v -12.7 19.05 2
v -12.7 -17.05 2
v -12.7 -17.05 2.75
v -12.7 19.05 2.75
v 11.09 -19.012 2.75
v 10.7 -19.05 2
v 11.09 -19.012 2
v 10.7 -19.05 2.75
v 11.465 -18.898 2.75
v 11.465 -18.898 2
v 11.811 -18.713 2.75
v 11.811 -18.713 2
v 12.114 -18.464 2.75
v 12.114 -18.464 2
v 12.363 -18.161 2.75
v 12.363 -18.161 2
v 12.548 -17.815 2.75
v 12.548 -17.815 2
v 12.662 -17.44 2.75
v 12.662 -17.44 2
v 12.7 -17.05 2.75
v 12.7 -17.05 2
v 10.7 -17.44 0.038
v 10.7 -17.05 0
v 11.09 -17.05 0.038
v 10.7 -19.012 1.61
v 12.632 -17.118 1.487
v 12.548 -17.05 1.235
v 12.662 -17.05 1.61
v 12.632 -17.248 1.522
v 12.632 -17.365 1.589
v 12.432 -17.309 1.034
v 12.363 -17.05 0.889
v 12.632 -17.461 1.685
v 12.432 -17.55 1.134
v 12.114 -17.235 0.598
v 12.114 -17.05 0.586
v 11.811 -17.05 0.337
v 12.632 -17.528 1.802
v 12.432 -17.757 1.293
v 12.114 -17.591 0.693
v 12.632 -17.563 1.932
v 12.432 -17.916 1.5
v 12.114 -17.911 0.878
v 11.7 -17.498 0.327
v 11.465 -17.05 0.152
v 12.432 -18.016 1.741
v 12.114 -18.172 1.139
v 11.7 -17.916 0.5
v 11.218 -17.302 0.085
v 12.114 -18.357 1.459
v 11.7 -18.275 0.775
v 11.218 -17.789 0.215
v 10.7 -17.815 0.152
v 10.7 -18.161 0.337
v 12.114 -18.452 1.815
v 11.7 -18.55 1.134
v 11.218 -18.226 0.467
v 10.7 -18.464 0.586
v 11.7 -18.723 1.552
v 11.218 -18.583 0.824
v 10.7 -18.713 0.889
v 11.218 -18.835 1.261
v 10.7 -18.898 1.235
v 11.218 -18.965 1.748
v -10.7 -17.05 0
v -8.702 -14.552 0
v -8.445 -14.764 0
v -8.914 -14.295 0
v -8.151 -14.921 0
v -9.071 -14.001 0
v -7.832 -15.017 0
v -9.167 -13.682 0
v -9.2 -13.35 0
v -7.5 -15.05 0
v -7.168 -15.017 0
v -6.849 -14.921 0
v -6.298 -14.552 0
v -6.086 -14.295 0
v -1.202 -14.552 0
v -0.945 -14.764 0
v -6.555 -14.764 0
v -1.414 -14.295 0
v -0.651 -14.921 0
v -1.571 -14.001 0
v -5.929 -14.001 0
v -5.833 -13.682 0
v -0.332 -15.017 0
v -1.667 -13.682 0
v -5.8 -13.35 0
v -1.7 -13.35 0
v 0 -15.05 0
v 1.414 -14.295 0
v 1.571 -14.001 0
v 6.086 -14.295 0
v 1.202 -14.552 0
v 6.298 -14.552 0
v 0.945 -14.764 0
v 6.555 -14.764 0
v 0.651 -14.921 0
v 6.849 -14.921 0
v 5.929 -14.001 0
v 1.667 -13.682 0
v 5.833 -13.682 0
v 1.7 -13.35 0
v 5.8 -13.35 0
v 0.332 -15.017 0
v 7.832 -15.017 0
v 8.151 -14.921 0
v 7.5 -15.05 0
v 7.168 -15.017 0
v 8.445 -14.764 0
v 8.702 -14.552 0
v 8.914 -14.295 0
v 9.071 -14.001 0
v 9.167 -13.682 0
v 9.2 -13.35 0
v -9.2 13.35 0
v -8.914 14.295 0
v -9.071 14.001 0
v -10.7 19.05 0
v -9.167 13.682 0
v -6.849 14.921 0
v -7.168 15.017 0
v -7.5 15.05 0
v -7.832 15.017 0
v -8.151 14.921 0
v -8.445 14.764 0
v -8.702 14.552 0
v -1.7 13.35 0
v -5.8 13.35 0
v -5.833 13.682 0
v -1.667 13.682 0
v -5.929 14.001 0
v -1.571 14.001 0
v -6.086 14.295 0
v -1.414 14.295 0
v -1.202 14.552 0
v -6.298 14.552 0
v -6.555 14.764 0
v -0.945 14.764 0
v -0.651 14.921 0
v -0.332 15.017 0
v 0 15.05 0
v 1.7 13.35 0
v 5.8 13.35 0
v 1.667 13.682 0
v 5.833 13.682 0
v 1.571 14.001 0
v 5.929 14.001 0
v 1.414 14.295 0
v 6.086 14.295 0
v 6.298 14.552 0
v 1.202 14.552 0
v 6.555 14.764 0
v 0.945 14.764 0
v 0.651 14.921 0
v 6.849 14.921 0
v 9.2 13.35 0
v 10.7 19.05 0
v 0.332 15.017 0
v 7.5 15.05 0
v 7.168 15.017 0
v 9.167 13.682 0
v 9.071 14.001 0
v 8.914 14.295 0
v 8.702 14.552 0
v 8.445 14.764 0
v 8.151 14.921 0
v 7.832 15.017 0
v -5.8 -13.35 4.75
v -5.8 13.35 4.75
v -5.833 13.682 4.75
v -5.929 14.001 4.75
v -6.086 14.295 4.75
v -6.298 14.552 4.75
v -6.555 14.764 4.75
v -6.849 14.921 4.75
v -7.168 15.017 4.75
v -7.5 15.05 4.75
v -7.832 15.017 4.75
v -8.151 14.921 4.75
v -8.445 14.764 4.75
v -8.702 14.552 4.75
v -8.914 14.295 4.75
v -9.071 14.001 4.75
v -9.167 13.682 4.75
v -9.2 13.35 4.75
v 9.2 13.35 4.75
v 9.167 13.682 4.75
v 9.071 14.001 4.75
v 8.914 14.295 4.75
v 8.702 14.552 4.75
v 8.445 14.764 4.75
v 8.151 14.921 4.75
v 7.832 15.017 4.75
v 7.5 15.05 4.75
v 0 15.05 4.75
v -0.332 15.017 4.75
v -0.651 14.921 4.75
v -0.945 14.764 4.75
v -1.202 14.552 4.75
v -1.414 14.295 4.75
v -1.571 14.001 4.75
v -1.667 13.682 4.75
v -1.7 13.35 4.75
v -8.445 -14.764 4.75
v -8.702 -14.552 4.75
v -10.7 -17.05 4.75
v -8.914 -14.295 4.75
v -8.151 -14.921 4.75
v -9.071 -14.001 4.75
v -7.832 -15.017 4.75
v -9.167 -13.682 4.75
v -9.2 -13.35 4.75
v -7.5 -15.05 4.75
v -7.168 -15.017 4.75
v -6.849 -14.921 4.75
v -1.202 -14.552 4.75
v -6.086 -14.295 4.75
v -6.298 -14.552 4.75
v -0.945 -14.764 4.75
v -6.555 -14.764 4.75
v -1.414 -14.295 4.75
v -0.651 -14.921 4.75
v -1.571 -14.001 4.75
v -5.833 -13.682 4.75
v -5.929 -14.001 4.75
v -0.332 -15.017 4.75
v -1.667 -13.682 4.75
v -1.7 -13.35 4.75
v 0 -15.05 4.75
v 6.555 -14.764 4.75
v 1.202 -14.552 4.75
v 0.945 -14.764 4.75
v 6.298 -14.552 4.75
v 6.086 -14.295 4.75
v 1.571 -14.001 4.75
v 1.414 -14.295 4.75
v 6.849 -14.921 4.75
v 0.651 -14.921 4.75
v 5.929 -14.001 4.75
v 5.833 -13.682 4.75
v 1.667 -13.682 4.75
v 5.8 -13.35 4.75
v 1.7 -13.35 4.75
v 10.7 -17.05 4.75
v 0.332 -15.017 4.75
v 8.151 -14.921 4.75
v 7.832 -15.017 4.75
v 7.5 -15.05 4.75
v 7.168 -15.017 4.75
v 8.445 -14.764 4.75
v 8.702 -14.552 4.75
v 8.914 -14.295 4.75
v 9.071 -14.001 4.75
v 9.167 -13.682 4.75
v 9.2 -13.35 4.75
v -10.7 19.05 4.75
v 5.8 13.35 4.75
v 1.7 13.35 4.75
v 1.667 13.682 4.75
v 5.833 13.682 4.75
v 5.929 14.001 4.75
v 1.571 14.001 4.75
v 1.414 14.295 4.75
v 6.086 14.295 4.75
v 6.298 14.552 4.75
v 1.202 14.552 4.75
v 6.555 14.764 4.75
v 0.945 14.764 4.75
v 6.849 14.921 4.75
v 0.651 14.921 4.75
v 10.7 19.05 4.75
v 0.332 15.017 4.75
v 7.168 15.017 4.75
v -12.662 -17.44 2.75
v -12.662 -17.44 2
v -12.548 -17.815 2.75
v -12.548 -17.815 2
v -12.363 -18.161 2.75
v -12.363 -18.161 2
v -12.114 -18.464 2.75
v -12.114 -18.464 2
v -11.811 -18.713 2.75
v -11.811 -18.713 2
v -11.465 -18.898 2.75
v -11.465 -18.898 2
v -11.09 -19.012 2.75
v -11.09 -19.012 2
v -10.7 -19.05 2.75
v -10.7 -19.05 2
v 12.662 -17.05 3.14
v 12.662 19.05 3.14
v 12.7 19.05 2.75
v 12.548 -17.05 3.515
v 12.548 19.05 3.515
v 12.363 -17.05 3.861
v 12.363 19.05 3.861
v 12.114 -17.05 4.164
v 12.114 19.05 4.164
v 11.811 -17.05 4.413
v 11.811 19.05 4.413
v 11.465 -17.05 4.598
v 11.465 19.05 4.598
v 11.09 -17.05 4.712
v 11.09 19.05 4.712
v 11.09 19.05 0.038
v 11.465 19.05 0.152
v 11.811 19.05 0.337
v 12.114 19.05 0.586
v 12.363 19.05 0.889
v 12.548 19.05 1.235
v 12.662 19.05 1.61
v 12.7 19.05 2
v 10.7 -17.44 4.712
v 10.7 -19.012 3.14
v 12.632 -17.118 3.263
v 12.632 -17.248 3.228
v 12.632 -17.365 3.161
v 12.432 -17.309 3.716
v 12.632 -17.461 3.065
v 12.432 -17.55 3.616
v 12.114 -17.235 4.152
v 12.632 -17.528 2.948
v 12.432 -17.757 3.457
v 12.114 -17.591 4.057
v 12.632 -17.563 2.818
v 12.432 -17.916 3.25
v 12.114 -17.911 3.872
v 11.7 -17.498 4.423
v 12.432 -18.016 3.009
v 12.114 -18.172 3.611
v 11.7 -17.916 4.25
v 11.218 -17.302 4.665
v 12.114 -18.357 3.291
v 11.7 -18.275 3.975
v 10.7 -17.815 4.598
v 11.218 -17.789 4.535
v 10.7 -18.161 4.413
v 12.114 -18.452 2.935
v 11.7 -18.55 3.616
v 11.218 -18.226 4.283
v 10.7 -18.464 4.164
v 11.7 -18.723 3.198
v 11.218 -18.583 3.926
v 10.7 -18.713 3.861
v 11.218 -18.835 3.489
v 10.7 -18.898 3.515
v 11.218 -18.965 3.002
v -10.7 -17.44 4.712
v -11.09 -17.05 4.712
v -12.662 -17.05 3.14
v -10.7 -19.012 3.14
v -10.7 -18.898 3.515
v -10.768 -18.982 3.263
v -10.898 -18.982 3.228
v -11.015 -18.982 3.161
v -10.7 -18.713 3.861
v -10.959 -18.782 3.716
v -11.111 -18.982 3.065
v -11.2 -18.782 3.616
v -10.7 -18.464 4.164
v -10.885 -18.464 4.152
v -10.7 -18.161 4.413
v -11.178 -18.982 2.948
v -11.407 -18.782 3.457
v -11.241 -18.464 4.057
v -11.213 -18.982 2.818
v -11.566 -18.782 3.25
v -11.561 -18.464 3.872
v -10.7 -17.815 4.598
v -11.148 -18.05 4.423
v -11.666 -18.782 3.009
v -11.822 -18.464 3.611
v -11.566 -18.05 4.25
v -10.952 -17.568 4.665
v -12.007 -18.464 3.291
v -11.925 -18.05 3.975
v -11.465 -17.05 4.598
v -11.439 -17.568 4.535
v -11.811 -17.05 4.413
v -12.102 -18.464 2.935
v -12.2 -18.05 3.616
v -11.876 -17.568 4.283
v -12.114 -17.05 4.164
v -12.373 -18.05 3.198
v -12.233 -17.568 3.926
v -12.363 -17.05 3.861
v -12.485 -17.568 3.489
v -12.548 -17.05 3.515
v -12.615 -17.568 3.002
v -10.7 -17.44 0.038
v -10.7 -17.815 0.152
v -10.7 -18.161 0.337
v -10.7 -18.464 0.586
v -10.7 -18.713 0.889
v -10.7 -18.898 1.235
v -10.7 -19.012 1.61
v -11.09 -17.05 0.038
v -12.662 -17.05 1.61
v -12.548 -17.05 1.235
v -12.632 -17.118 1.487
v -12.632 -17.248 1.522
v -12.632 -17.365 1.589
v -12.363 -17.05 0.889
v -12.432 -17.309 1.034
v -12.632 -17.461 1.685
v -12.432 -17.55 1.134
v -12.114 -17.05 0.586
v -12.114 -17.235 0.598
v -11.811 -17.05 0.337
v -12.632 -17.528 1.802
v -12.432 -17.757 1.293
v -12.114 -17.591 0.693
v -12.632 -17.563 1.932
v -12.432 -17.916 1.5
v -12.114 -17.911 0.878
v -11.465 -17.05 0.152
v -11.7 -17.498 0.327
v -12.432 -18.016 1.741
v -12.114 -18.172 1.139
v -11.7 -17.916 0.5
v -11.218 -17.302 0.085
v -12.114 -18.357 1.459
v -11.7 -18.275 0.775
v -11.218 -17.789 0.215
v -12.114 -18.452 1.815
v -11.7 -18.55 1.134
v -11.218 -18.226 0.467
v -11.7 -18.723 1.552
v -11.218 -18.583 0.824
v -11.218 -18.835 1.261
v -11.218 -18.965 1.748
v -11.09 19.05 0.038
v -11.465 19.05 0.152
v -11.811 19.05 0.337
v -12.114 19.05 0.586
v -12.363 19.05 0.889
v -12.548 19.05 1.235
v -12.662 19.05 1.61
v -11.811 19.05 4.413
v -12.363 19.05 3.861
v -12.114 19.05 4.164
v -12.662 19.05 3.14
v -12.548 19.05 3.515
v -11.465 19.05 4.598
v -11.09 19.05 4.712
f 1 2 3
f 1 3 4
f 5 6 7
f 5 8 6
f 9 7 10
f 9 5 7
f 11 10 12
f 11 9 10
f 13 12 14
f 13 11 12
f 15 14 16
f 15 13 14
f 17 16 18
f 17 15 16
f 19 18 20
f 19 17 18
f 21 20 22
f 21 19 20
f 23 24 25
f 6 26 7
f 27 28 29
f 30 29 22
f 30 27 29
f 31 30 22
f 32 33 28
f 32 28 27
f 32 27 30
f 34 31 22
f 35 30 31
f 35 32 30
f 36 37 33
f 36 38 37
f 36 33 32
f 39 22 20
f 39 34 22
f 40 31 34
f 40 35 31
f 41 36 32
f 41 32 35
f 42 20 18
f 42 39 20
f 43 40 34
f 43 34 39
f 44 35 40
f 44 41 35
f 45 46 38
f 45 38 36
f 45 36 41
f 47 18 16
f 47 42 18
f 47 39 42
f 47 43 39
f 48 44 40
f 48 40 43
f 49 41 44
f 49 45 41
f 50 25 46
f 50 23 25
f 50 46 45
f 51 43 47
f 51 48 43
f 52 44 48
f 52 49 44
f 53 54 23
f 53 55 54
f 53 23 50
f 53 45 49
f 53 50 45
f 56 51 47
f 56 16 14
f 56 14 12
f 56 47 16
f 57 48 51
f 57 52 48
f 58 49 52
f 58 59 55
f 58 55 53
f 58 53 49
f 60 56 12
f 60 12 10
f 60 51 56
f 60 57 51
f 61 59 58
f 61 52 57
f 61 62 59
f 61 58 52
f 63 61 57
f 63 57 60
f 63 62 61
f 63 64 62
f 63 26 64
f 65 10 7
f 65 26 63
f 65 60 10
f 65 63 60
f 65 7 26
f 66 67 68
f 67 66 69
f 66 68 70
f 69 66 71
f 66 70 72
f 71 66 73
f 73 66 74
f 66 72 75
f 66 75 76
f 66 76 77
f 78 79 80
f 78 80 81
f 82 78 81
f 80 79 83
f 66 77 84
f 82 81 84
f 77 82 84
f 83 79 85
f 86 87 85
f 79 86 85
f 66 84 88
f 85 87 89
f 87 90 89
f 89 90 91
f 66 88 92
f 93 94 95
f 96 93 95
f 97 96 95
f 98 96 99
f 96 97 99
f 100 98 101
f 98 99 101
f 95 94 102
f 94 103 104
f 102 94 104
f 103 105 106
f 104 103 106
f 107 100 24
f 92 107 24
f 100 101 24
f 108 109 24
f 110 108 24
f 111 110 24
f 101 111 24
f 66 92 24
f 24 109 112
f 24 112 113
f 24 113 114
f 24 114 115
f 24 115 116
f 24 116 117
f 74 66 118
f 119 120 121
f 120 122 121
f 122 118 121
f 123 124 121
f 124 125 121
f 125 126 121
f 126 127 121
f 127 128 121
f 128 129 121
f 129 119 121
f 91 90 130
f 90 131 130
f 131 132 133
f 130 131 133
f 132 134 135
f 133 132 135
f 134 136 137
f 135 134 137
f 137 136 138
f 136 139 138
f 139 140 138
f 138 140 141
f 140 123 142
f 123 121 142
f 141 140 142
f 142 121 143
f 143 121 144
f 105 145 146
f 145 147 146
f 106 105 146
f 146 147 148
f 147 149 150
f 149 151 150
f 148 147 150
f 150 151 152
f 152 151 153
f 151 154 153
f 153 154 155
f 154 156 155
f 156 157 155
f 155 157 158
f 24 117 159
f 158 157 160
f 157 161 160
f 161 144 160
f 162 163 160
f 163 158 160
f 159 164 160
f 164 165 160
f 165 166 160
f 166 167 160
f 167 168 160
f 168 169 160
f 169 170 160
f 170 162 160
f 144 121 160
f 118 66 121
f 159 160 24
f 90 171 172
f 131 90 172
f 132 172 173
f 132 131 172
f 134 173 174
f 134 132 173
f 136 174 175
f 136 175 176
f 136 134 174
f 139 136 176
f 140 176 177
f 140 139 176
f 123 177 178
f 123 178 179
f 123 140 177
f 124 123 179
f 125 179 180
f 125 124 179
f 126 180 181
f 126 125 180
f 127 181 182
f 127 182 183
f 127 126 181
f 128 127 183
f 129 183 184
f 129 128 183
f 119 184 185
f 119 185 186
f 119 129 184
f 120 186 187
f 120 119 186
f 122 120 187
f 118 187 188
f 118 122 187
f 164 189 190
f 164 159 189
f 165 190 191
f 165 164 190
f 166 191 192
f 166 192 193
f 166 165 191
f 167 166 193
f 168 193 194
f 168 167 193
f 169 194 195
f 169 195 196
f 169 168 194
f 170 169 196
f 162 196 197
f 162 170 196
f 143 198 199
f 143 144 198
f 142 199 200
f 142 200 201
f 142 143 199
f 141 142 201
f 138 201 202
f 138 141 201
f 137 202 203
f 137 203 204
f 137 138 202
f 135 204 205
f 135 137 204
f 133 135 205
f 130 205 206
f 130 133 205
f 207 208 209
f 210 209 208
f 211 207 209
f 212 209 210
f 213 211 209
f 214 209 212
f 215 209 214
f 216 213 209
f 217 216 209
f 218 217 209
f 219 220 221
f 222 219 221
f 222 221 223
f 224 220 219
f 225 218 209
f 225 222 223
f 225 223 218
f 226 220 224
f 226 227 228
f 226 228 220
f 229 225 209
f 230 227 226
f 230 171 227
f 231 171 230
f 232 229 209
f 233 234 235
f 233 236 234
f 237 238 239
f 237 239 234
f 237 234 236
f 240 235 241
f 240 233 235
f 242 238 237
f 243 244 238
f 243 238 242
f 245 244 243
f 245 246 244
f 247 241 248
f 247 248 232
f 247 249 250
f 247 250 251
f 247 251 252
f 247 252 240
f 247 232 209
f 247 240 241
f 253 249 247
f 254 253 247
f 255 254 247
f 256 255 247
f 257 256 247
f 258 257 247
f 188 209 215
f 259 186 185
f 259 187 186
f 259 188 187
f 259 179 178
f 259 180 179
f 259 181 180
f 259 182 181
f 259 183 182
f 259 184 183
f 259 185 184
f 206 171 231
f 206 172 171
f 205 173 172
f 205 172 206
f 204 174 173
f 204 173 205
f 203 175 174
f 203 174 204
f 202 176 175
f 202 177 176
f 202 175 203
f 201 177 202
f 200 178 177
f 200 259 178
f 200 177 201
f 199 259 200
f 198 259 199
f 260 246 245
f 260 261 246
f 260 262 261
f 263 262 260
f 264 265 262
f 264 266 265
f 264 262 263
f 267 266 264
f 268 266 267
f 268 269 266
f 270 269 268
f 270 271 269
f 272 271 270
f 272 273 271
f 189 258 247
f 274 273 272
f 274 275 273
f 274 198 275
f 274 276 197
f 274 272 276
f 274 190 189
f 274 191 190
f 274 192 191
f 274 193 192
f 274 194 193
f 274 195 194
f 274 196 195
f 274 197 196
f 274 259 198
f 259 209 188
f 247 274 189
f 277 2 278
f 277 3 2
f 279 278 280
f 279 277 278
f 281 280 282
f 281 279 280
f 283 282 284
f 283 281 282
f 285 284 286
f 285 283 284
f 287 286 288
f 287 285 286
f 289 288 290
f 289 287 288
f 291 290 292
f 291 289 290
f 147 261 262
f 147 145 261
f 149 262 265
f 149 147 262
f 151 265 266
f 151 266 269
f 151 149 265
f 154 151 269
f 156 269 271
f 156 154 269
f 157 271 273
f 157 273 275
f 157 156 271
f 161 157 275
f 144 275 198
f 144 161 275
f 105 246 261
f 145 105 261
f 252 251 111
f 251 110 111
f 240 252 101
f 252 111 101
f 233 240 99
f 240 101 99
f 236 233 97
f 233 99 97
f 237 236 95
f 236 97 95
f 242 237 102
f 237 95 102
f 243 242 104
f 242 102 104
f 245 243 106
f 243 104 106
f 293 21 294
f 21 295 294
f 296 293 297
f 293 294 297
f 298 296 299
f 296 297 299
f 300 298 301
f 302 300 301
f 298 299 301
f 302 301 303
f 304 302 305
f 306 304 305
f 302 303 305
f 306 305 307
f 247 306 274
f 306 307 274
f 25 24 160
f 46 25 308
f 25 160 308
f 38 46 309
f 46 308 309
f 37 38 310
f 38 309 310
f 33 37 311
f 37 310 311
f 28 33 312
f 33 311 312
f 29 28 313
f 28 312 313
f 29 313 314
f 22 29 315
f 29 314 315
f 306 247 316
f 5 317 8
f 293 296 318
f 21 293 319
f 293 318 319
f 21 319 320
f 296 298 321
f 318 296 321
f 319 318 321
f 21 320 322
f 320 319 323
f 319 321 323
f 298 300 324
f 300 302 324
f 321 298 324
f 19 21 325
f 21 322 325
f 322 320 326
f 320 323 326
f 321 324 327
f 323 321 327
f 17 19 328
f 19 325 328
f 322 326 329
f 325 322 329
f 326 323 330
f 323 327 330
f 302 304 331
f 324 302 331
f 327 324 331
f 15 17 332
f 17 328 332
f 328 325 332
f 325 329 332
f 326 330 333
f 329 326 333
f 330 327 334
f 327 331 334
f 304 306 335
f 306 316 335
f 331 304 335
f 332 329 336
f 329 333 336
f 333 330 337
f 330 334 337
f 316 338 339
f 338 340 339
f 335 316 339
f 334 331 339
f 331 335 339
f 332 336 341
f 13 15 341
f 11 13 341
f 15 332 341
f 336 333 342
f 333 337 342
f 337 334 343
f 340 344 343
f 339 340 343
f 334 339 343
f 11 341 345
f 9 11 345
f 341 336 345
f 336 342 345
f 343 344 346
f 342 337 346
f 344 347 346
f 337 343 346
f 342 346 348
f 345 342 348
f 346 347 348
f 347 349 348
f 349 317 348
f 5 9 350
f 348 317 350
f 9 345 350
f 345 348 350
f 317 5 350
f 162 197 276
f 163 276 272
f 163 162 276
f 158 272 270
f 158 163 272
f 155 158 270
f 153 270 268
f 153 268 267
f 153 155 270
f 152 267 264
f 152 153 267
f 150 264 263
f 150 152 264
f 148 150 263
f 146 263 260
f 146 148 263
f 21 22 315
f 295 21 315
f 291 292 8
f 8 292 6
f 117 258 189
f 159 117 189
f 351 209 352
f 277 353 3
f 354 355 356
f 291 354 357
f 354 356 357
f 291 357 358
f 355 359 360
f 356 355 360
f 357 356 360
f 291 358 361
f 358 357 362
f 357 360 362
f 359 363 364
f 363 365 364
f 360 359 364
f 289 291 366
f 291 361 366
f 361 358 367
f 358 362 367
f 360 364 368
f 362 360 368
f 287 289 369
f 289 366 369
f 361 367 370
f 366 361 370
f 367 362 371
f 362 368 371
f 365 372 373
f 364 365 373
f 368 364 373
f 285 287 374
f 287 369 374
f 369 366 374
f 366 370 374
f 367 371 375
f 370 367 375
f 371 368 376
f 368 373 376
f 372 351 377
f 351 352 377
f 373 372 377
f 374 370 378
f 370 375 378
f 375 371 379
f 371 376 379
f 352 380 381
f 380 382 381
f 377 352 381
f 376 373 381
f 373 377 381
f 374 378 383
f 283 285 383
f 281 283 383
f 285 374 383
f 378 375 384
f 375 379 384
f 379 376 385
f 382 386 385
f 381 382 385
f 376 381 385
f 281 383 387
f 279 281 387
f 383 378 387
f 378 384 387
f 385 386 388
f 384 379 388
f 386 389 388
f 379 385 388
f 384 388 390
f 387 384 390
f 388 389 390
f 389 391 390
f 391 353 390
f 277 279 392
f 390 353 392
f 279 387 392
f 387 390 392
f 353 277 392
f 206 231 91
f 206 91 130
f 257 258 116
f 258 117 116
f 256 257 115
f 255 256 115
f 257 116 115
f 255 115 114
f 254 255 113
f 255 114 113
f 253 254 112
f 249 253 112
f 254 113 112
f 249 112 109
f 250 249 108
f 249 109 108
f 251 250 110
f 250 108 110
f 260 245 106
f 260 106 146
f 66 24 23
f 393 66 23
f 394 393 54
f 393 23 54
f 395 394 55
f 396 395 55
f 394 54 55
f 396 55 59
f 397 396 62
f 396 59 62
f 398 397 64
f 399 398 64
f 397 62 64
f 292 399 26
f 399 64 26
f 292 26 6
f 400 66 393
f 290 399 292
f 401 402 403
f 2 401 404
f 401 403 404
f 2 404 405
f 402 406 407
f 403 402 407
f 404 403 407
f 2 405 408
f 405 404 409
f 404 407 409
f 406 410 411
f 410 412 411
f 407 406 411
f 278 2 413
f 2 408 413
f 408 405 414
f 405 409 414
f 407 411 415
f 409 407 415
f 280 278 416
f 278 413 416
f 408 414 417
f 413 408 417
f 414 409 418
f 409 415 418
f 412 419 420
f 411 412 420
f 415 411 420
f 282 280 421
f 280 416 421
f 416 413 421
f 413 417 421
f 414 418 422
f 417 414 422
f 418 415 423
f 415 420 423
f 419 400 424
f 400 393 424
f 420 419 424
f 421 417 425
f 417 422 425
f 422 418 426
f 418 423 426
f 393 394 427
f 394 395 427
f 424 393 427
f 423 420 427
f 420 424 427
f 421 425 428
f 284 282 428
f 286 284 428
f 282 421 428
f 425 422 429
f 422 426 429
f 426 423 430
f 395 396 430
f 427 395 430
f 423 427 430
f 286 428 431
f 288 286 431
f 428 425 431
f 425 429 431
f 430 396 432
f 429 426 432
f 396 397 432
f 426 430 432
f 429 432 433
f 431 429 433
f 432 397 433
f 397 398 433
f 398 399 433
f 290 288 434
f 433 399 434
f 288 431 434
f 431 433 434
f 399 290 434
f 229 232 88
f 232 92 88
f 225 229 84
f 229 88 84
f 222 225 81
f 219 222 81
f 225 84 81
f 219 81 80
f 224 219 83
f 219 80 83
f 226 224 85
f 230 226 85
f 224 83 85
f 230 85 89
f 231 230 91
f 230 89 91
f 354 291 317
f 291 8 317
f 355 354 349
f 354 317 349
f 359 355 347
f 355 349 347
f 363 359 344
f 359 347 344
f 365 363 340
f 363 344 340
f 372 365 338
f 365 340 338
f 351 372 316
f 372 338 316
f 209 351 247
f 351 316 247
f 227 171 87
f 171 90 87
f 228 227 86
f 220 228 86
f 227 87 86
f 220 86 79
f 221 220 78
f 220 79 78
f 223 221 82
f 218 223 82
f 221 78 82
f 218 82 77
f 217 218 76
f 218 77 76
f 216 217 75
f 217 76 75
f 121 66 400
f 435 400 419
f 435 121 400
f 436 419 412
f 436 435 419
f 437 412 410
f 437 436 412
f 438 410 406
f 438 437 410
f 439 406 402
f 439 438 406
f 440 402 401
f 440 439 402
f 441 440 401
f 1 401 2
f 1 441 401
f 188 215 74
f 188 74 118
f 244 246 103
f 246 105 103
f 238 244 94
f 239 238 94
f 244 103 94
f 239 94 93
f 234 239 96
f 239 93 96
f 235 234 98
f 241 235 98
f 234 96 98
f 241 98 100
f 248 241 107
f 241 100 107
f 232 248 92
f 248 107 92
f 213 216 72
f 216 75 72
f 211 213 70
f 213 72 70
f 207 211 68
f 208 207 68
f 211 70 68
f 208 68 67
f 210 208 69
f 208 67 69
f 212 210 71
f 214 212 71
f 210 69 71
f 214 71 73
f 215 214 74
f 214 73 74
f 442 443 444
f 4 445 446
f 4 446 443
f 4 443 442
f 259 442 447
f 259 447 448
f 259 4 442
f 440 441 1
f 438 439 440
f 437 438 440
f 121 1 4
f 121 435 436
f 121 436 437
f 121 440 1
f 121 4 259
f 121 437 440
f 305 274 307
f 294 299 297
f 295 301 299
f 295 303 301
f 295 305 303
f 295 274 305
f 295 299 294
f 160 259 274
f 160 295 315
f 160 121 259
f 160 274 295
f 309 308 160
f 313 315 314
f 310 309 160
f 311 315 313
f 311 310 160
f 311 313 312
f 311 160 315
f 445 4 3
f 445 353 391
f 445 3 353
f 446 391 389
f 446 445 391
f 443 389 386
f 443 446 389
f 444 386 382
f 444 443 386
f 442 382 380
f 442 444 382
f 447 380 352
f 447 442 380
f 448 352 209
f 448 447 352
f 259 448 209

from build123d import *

# Parameters (mm, degrees)
SKETCH1_W           = 25.4
SKETCH1_H           = 38.1
BOSS_EXTRUDE1_DEPTH = 4.75
SKETCH2_W           = 3.4
SKETCH2_H           = 30.1
CUT_EXTRUDE1_DEPTH  = 24.382792819
FILLET1_R           = 1.7
FILLET2_R           = 1.7
FILLET3_R           = 1.7
FILLET4_R           = 1.7
FILLET5_R           = 2
FILLET6_R           = 1.7
FILLET7_R           = 1.7


with BuildPart() as part:
    # Sketch1 → Boss-Extrude1 (new body)
    with BuildSketch(Plane.XY):
        Rectangle(SKETCH1_W, SKETCH1_H)
    extrude(amount=BOSS_EXTRUDE1_DEPTH)

    # Sketch2 → Cut-Extrude1 (cut, through all)
    with BuildSketch(Plane.XY.offset(4.75)):
        with Locations((7.5, 0)):
            Rectangle(SKETCH2_W, SKETCH2_H)
        with Locations((-7.5, 0)):
            Rectangle(SKETCH2_W, SKETCH2_H)
        Rectangle(SKETCH2_W, SKETCH2_H)
    extrude(amount=-CUT_EXTRUDE1_DEPTH, mode=Mode.SUBTRACT)

    # Fillet1
    fillet1_edges = [part.edges().sort_by_distance(p)[0] for p in [
        (-5.8, 15.05, 2.375),
        (-9.2, 15.05, 2.375),
    ]]
    fillet(fillet1_edges, radius=FILLET1_R - 0.0001)  # a hair under: the kernel refuses the full size

    # Fillet2
    fillet2_edges = [part.edges().sort_by_distance(p)[0] for p in [
        (-5.8, -15.05, 2.375),
        (-9.2, -15.05, 2.375),
    ]]
    fillet(fillet2_edges, radius=FILLET2_R - 0.0001)  # a hair under: the kernel refuses the full size

    # Fillet3
    fillet3_edges = [part.edges().sort_by_distance(p)[0] for p in [
        (9.2, 15.05, 2.375),
        (5.8, 15.05, 2.375),
    ]]
    fillet(fillet3_edges, radius=FILLET3_R - 0.0001)  # a hair under: the kernel refuses the full size

    # Fillet4
    fillet4_edges = [part.edges().sort_by_distance(p)[0] for p in [
        (9.2, -15.05, 2.375),
        (5.8, -15.05, 2.375),
    ]]
    fillet(fillet4_edges, radius=FILLET4_R - 0.0001)  # a hair under: the kernel refuses the full size

    # Fillet5
    fillet5_edges = [part.edges().sort_by_distance(p)[0] for p in [
        (-12.7, 0, 4.75),
        (0, -19.05, 4.75),
        (12.7, 0, 4.75),
        (0, -19.05, 0),
        (-12.7, 0, 0),
        (12.7, 0, 0),
        (12.7, -19.05, 2.375),
        (-12.7, -19.05, 2.375),
    ]]
    fillet(fillet5_edges, radius=FILLET5_R)

    # Fillet6
    fillet6_edges = [part.edges().sort_by_distance(p)[0] for p in [
        (1.7, 15.05, 2.375),
        (-1.7, 15.05, 2.375),
    ]]
    fillet(fillet6_edges, radius=FILLET6_R - 0.0001)  # a hair under: the kernel refuses the full size

    # Fillet7
    fillet7_edges = [part.edges().sort_by_distance(p)[0] for p in [
        (1.7, -15.05, 2.375),
        (-1.7, -15.05, 2.375),
    ]]
    fillet(fillet7_edges, radius=FILLET7_R - 0.0001)  # a hair under: the kernel refuses the full size


solid = part.part
